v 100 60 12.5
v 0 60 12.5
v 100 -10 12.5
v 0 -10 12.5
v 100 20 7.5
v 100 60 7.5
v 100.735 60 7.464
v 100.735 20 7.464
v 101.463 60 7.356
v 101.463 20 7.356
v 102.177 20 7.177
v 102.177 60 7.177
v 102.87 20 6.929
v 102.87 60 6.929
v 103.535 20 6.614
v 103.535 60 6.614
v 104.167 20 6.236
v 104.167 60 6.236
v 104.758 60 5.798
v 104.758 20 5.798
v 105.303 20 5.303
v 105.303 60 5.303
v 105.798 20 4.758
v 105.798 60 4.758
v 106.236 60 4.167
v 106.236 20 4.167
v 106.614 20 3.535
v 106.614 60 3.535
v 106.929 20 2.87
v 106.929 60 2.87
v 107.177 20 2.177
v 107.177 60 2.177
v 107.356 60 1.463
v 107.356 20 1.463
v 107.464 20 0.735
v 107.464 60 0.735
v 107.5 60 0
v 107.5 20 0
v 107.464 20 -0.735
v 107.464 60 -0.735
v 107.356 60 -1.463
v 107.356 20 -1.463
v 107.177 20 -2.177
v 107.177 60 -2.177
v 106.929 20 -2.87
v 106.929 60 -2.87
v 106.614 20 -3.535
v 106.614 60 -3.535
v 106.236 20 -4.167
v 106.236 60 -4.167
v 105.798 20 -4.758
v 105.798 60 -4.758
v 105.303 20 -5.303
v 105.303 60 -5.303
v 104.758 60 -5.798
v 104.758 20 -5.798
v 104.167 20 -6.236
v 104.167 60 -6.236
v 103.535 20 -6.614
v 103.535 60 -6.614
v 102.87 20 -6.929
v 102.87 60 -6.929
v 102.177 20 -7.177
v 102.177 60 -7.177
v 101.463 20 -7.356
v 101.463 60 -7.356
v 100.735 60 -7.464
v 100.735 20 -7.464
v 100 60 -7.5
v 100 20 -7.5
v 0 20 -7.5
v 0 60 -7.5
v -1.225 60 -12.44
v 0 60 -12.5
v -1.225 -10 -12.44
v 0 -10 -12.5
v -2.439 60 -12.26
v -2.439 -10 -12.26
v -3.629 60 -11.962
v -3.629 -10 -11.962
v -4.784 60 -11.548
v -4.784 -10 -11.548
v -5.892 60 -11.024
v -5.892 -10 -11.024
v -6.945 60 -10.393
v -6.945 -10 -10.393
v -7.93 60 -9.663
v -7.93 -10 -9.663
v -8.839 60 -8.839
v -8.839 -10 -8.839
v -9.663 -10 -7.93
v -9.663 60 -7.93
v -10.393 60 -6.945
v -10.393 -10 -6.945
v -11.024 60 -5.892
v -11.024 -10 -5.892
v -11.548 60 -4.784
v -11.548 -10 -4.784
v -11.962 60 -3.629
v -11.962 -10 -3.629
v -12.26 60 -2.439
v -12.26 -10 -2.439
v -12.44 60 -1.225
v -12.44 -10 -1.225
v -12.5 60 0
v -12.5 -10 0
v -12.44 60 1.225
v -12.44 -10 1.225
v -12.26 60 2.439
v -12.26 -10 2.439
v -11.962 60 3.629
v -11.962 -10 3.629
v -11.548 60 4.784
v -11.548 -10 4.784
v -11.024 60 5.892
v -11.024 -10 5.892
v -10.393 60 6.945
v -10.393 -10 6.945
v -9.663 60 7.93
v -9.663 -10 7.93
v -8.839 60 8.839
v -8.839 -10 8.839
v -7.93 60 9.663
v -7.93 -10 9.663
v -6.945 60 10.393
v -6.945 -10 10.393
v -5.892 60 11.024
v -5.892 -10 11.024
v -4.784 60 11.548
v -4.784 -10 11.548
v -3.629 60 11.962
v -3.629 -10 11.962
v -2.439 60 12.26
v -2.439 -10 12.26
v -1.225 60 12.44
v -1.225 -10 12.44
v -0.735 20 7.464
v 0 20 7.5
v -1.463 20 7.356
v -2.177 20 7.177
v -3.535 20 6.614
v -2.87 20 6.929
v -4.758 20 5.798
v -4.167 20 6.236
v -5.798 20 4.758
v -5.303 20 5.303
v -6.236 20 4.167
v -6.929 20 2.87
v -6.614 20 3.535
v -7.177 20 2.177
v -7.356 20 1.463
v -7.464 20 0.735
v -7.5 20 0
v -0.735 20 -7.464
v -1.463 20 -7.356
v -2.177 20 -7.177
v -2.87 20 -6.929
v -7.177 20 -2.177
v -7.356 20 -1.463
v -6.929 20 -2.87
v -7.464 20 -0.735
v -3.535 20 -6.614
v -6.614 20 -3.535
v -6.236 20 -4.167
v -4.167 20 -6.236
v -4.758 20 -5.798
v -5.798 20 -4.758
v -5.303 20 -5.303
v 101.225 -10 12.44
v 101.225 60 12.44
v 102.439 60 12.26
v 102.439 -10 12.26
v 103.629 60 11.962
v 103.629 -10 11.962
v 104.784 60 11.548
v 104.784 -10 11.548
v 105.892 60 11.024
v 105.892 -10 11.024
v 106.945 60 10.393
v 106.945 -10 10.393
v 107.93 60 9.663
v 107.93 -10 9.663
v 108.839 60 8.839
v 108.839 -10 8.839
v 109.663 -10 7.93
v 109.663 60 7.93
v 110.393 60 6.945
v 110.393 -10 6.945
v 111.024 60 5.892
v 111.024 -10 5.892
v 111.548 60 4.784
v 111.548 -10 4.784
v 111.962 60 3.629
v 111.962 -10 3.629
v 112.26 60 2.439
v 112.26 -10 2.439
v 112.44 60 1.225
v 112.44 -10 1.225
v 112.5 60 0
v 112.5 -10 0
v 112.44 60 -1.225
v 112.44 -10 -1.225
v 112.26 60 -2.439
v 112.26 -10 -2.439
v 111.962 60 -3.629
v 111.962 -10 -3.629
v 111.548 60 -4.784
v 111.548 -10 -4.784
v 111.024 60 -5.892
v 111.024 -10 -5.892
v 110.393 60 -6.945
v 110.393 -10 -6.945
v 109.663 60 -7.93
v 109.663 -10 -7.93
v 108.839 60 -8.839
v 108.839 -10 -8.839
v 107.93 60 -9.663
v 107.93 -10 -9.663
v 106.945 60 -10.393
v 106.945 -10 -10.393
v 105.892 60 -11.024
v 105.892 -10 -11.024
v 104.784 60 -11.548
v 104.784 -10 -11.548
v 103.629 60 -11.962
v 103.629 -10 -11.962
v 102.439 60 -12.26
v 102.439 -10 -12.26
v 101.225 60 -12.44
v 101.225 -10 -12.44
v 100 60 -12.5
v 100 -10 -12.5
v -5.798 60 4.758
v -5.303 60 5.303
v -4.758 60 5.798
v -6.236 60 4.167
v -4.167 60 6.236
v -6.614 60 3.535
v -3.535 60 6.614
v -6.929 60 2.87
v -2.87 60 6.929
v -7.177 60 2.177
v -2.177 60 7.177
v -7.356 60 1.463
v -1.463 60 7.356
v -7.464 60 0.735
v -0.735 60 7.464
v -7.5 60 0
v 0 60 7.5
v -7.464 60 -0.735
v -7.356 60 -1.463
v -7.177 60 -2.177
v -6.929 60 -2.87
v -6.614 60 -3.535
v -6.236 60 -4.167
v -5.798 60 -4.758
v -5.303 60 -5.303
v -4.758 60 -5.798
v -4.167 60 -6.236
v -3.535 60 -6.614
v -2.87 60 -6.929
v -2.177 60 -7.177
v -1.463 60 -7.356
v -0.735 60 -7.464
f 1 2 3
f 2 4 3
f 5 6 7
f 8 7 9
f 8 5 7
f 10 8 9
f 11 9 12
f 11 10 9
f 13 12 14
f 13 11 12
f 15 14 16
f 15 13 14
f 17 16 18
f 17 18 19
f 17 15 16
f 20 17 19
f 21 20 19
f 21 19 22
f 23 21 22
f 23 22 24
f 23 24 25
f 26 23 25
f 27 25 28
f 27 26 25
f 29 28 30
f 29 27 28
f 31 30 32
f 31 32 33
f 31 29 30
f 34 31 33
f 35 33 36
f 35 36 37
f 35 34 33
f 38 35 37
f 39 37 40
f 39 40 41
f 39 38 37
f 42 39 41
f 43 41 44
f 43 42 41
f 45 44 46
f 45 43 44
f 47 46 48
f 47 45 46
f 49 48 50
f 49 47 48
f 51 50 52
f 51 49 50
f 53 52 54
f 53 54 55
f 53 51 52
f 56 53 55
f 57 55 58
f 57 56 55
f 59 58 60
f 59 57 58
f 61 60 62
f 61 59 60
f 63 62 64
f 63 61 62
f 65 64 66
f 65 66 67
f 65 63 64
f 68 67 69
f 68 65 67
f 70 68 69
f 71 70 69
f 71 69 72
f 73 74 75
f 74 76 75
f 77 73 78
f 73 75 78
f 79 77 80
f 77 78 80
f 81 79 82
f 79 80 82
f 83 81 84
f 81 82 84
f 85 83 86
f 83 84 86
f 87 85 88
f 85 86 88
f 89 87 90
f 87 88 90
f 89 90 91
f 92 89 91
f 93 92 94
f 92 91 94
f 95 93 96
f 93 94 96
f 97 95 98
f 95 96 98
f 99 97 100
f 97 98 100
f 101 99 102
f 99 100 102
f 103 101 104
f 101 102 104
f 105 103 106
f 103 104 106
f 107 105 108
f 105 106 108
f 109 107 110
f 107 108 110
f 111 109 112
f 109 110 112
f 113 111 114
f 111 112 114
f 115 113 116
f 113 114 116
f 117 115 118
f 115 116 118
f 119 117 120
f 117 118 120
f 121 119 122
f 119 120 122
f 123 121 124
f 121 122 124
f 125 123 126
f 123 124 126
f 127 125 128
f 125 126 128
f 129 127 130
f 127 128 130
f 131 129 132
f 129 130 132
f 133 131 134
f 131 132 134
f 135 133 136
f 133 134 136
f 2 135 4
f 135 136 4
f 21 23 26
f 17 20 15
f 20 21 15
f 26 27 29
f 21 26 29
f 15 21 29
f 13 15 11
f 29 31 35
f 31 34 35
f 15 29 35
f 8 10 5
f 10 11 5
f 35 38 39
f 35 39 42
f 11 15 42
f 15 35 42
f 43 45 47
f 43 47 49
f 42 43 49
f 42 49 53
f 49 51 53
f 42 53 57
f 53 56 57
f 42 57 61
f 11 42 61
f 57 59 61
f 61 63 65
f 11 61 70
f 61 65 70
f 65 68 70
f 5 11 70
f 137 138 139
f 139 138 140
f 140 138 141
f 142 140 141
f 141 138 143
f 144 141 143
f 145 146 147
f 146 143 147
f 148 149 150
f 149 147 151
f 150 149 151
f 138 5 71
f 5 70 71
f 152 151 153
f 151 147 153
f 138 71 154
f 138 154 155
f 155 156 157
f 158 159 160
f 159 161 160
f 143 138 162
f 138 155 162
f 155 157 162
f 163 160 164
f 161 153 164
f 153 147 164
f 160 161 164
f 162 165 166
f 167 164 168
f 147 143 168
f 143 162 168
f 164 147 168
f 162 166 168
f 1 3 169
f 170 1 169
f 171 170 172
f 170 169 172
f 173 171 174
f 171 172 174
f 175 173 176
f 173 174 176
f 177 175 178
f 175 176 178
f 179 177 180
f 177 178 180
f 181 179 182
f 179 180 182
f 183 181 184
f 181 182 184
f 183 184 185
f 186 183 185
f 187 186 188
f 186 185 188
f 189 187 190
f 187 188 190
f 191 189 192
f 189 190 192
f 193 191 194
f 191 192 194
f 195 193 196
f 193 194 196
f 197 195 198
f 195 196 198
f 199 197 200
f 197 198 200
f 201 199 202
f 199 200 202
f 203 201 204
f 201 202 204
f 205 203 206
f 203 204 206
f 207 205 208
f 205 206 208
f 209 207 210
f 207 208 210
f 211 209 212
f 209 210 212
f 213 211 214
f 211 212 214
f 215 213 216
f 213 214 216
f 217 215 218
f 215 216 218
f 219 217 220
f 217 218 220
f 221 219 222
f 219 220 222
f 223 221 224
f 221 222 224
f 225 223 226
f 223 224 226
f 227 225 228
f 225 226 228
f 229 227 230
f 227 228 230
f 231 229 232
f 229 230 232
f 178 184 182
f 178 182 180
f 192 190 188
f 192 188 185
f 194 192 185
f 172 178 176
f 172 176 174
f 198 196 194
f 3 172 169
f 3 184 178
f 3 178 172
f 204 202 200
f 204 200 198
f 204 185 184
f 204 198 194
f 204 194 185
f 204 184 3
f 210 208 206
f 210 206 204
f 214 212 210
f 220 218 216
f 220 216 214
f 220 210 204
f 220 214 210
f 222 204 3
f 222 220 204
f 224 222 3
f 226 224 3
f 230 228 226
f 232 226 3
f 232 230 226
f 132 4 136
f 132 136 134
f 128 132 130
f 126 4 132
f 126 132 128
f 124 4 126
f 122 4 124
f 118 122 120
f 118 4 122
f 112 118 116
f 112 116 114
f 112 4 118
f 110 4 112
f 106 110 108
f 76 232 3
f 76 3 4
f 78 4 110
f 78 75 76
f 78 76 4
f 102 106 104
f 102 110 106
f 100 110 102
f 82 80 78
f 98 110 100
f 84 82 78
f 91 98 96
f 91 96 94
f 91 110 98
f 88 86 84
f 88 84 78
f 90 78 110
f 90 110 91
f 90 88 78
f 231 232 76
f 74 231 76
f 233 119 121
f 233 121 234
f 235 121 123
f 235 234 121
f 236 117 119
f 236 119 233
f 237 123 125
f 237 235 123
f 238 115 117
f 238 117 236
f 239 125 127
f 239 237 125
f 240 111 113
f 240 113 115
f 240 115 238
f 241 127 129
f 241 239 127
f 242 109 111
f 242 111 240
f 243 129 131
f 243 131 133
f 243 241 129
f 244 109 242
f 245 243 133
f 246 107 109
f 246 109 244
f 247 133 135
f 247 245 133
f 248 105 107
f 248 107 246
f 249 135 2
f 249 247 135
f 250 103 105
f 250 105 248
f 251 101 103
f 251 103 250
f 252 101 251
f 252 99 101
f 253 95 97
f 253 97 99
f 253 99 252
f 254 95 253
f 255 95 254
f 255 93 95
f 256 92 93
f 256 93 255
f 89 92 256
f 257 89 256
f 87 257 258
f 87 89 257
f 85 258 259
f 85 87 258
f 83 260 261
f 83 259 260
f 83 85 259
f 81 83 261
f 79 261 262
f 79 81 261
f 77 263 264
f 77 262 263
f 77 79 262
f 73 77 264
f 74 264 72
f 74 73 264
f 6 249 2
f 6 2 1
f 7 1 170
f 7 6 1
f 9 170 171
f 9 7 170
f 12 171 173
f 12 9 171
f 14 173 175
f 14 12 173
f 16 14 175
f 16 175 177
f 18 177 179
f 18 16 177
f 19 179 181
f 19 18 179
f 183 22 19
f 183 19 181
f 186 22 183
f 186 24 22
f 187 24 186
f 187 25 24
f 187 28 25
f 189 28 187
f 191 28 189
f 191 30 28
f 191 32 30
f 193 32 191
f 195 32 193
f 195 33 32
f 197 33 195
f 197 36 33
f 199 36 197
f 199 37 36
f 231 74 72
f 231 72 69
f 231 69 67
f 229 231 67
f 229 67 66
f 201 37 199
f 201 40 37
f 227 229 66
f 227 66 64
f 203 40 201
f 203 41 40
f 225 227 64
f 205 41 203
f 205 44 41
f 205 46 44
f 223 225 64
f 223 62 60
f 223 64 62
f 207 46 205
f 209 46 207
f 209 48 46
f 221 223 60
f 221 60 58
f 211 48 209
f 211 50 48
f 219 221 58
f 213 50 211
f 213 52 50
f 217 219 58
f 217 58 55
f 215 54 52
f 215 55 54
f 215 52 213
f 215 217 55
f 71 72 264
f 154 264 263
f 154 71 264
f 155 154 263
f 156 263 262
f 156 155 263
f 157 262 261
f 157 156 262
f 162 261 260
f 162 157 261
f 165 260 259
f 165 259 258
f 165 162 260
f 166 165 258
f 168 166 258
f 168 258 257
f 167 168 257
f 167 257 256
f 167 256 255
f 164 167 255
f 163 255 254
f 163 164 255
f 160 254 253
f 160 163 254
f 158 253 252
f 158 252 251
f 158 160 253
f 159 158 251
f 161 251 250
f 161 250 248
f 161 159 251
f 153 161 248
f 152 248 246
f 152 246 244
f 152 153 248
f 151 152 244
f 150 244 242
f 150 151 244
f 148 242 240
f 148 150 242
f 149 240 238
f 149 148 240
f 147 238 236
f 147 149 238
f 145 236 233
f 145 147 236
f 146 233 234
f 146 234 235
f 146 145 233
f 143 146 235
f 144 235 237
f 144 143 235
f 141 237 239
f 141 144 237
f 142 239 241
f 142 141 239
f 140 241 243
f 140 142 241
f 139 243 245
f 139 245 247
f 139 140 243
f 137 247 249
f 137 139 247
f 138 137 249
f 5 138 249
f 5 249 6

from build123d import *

# Parameters (mm, degrees)
EXTRUDE_1_DEPTH      = 20
EXTRUDE_1_DEPTH_BACK = 10
EXTRUDE_1_2_DEPTH    = 40


with BuildPart() as part:
    # 草图1 → Extrude 1 (new, two sides: drawn at the far end of the back side and taken through both)
    with BuildSketch(Plane(origin=(0, 0, 0), x_dir=(1, 0, 0), z_dir=(0, 1, 0)).offset(-EXTRUDE_1_DEPTH_BACK)):
        with BuildLine():
            Line((0, 12.5), (100, 12.5))
            ThreePointArc((100, 12.5), (112.5, 0), (100, -12.5))
            Line((100, -12.5), (0, -12.5))
            ThreePointArc((0, -12.5), (-12.5, 0), (0, 12.5))
        make_face()
    extrude(amount=EXTRUDE_1_DEPTH + EXTRUDE_1_DEPTH_BACK)

    # 草图2 → Extrude 1 2 (add)
    with BuildSketch(Plane(origin=(0, 20, 0), x_dir=(1, 0, 0), z_dir=(0, 1, 0))):
        with BuildLine():
            Line((100, 12.5), (0, 12.5))
            ThreePointArc((0, 12.5), (-12.5, 0), (0, -12.5))
            Line((0, -12.5), (100, -12.5))
            ThreePointArc((100, -12.5), (112.5, 0), (100, 12.5))
        make_face()
        with BuildLine():
            Line((100, 7.5), (0, 7.5))
            ThreePointArc((0, 7.5), (-7.5, 0), (0, -7.5))
            Line((0, -7.5), (100, -7.5))
            ThreePointArc((100, -7.5), (107.5, 0), (100, 7.5))
        make_face(mode=Mode.SUBTRACT)
    extrude(amount=EXTRUDE_1_2_DEPTH)


solid = part.part
